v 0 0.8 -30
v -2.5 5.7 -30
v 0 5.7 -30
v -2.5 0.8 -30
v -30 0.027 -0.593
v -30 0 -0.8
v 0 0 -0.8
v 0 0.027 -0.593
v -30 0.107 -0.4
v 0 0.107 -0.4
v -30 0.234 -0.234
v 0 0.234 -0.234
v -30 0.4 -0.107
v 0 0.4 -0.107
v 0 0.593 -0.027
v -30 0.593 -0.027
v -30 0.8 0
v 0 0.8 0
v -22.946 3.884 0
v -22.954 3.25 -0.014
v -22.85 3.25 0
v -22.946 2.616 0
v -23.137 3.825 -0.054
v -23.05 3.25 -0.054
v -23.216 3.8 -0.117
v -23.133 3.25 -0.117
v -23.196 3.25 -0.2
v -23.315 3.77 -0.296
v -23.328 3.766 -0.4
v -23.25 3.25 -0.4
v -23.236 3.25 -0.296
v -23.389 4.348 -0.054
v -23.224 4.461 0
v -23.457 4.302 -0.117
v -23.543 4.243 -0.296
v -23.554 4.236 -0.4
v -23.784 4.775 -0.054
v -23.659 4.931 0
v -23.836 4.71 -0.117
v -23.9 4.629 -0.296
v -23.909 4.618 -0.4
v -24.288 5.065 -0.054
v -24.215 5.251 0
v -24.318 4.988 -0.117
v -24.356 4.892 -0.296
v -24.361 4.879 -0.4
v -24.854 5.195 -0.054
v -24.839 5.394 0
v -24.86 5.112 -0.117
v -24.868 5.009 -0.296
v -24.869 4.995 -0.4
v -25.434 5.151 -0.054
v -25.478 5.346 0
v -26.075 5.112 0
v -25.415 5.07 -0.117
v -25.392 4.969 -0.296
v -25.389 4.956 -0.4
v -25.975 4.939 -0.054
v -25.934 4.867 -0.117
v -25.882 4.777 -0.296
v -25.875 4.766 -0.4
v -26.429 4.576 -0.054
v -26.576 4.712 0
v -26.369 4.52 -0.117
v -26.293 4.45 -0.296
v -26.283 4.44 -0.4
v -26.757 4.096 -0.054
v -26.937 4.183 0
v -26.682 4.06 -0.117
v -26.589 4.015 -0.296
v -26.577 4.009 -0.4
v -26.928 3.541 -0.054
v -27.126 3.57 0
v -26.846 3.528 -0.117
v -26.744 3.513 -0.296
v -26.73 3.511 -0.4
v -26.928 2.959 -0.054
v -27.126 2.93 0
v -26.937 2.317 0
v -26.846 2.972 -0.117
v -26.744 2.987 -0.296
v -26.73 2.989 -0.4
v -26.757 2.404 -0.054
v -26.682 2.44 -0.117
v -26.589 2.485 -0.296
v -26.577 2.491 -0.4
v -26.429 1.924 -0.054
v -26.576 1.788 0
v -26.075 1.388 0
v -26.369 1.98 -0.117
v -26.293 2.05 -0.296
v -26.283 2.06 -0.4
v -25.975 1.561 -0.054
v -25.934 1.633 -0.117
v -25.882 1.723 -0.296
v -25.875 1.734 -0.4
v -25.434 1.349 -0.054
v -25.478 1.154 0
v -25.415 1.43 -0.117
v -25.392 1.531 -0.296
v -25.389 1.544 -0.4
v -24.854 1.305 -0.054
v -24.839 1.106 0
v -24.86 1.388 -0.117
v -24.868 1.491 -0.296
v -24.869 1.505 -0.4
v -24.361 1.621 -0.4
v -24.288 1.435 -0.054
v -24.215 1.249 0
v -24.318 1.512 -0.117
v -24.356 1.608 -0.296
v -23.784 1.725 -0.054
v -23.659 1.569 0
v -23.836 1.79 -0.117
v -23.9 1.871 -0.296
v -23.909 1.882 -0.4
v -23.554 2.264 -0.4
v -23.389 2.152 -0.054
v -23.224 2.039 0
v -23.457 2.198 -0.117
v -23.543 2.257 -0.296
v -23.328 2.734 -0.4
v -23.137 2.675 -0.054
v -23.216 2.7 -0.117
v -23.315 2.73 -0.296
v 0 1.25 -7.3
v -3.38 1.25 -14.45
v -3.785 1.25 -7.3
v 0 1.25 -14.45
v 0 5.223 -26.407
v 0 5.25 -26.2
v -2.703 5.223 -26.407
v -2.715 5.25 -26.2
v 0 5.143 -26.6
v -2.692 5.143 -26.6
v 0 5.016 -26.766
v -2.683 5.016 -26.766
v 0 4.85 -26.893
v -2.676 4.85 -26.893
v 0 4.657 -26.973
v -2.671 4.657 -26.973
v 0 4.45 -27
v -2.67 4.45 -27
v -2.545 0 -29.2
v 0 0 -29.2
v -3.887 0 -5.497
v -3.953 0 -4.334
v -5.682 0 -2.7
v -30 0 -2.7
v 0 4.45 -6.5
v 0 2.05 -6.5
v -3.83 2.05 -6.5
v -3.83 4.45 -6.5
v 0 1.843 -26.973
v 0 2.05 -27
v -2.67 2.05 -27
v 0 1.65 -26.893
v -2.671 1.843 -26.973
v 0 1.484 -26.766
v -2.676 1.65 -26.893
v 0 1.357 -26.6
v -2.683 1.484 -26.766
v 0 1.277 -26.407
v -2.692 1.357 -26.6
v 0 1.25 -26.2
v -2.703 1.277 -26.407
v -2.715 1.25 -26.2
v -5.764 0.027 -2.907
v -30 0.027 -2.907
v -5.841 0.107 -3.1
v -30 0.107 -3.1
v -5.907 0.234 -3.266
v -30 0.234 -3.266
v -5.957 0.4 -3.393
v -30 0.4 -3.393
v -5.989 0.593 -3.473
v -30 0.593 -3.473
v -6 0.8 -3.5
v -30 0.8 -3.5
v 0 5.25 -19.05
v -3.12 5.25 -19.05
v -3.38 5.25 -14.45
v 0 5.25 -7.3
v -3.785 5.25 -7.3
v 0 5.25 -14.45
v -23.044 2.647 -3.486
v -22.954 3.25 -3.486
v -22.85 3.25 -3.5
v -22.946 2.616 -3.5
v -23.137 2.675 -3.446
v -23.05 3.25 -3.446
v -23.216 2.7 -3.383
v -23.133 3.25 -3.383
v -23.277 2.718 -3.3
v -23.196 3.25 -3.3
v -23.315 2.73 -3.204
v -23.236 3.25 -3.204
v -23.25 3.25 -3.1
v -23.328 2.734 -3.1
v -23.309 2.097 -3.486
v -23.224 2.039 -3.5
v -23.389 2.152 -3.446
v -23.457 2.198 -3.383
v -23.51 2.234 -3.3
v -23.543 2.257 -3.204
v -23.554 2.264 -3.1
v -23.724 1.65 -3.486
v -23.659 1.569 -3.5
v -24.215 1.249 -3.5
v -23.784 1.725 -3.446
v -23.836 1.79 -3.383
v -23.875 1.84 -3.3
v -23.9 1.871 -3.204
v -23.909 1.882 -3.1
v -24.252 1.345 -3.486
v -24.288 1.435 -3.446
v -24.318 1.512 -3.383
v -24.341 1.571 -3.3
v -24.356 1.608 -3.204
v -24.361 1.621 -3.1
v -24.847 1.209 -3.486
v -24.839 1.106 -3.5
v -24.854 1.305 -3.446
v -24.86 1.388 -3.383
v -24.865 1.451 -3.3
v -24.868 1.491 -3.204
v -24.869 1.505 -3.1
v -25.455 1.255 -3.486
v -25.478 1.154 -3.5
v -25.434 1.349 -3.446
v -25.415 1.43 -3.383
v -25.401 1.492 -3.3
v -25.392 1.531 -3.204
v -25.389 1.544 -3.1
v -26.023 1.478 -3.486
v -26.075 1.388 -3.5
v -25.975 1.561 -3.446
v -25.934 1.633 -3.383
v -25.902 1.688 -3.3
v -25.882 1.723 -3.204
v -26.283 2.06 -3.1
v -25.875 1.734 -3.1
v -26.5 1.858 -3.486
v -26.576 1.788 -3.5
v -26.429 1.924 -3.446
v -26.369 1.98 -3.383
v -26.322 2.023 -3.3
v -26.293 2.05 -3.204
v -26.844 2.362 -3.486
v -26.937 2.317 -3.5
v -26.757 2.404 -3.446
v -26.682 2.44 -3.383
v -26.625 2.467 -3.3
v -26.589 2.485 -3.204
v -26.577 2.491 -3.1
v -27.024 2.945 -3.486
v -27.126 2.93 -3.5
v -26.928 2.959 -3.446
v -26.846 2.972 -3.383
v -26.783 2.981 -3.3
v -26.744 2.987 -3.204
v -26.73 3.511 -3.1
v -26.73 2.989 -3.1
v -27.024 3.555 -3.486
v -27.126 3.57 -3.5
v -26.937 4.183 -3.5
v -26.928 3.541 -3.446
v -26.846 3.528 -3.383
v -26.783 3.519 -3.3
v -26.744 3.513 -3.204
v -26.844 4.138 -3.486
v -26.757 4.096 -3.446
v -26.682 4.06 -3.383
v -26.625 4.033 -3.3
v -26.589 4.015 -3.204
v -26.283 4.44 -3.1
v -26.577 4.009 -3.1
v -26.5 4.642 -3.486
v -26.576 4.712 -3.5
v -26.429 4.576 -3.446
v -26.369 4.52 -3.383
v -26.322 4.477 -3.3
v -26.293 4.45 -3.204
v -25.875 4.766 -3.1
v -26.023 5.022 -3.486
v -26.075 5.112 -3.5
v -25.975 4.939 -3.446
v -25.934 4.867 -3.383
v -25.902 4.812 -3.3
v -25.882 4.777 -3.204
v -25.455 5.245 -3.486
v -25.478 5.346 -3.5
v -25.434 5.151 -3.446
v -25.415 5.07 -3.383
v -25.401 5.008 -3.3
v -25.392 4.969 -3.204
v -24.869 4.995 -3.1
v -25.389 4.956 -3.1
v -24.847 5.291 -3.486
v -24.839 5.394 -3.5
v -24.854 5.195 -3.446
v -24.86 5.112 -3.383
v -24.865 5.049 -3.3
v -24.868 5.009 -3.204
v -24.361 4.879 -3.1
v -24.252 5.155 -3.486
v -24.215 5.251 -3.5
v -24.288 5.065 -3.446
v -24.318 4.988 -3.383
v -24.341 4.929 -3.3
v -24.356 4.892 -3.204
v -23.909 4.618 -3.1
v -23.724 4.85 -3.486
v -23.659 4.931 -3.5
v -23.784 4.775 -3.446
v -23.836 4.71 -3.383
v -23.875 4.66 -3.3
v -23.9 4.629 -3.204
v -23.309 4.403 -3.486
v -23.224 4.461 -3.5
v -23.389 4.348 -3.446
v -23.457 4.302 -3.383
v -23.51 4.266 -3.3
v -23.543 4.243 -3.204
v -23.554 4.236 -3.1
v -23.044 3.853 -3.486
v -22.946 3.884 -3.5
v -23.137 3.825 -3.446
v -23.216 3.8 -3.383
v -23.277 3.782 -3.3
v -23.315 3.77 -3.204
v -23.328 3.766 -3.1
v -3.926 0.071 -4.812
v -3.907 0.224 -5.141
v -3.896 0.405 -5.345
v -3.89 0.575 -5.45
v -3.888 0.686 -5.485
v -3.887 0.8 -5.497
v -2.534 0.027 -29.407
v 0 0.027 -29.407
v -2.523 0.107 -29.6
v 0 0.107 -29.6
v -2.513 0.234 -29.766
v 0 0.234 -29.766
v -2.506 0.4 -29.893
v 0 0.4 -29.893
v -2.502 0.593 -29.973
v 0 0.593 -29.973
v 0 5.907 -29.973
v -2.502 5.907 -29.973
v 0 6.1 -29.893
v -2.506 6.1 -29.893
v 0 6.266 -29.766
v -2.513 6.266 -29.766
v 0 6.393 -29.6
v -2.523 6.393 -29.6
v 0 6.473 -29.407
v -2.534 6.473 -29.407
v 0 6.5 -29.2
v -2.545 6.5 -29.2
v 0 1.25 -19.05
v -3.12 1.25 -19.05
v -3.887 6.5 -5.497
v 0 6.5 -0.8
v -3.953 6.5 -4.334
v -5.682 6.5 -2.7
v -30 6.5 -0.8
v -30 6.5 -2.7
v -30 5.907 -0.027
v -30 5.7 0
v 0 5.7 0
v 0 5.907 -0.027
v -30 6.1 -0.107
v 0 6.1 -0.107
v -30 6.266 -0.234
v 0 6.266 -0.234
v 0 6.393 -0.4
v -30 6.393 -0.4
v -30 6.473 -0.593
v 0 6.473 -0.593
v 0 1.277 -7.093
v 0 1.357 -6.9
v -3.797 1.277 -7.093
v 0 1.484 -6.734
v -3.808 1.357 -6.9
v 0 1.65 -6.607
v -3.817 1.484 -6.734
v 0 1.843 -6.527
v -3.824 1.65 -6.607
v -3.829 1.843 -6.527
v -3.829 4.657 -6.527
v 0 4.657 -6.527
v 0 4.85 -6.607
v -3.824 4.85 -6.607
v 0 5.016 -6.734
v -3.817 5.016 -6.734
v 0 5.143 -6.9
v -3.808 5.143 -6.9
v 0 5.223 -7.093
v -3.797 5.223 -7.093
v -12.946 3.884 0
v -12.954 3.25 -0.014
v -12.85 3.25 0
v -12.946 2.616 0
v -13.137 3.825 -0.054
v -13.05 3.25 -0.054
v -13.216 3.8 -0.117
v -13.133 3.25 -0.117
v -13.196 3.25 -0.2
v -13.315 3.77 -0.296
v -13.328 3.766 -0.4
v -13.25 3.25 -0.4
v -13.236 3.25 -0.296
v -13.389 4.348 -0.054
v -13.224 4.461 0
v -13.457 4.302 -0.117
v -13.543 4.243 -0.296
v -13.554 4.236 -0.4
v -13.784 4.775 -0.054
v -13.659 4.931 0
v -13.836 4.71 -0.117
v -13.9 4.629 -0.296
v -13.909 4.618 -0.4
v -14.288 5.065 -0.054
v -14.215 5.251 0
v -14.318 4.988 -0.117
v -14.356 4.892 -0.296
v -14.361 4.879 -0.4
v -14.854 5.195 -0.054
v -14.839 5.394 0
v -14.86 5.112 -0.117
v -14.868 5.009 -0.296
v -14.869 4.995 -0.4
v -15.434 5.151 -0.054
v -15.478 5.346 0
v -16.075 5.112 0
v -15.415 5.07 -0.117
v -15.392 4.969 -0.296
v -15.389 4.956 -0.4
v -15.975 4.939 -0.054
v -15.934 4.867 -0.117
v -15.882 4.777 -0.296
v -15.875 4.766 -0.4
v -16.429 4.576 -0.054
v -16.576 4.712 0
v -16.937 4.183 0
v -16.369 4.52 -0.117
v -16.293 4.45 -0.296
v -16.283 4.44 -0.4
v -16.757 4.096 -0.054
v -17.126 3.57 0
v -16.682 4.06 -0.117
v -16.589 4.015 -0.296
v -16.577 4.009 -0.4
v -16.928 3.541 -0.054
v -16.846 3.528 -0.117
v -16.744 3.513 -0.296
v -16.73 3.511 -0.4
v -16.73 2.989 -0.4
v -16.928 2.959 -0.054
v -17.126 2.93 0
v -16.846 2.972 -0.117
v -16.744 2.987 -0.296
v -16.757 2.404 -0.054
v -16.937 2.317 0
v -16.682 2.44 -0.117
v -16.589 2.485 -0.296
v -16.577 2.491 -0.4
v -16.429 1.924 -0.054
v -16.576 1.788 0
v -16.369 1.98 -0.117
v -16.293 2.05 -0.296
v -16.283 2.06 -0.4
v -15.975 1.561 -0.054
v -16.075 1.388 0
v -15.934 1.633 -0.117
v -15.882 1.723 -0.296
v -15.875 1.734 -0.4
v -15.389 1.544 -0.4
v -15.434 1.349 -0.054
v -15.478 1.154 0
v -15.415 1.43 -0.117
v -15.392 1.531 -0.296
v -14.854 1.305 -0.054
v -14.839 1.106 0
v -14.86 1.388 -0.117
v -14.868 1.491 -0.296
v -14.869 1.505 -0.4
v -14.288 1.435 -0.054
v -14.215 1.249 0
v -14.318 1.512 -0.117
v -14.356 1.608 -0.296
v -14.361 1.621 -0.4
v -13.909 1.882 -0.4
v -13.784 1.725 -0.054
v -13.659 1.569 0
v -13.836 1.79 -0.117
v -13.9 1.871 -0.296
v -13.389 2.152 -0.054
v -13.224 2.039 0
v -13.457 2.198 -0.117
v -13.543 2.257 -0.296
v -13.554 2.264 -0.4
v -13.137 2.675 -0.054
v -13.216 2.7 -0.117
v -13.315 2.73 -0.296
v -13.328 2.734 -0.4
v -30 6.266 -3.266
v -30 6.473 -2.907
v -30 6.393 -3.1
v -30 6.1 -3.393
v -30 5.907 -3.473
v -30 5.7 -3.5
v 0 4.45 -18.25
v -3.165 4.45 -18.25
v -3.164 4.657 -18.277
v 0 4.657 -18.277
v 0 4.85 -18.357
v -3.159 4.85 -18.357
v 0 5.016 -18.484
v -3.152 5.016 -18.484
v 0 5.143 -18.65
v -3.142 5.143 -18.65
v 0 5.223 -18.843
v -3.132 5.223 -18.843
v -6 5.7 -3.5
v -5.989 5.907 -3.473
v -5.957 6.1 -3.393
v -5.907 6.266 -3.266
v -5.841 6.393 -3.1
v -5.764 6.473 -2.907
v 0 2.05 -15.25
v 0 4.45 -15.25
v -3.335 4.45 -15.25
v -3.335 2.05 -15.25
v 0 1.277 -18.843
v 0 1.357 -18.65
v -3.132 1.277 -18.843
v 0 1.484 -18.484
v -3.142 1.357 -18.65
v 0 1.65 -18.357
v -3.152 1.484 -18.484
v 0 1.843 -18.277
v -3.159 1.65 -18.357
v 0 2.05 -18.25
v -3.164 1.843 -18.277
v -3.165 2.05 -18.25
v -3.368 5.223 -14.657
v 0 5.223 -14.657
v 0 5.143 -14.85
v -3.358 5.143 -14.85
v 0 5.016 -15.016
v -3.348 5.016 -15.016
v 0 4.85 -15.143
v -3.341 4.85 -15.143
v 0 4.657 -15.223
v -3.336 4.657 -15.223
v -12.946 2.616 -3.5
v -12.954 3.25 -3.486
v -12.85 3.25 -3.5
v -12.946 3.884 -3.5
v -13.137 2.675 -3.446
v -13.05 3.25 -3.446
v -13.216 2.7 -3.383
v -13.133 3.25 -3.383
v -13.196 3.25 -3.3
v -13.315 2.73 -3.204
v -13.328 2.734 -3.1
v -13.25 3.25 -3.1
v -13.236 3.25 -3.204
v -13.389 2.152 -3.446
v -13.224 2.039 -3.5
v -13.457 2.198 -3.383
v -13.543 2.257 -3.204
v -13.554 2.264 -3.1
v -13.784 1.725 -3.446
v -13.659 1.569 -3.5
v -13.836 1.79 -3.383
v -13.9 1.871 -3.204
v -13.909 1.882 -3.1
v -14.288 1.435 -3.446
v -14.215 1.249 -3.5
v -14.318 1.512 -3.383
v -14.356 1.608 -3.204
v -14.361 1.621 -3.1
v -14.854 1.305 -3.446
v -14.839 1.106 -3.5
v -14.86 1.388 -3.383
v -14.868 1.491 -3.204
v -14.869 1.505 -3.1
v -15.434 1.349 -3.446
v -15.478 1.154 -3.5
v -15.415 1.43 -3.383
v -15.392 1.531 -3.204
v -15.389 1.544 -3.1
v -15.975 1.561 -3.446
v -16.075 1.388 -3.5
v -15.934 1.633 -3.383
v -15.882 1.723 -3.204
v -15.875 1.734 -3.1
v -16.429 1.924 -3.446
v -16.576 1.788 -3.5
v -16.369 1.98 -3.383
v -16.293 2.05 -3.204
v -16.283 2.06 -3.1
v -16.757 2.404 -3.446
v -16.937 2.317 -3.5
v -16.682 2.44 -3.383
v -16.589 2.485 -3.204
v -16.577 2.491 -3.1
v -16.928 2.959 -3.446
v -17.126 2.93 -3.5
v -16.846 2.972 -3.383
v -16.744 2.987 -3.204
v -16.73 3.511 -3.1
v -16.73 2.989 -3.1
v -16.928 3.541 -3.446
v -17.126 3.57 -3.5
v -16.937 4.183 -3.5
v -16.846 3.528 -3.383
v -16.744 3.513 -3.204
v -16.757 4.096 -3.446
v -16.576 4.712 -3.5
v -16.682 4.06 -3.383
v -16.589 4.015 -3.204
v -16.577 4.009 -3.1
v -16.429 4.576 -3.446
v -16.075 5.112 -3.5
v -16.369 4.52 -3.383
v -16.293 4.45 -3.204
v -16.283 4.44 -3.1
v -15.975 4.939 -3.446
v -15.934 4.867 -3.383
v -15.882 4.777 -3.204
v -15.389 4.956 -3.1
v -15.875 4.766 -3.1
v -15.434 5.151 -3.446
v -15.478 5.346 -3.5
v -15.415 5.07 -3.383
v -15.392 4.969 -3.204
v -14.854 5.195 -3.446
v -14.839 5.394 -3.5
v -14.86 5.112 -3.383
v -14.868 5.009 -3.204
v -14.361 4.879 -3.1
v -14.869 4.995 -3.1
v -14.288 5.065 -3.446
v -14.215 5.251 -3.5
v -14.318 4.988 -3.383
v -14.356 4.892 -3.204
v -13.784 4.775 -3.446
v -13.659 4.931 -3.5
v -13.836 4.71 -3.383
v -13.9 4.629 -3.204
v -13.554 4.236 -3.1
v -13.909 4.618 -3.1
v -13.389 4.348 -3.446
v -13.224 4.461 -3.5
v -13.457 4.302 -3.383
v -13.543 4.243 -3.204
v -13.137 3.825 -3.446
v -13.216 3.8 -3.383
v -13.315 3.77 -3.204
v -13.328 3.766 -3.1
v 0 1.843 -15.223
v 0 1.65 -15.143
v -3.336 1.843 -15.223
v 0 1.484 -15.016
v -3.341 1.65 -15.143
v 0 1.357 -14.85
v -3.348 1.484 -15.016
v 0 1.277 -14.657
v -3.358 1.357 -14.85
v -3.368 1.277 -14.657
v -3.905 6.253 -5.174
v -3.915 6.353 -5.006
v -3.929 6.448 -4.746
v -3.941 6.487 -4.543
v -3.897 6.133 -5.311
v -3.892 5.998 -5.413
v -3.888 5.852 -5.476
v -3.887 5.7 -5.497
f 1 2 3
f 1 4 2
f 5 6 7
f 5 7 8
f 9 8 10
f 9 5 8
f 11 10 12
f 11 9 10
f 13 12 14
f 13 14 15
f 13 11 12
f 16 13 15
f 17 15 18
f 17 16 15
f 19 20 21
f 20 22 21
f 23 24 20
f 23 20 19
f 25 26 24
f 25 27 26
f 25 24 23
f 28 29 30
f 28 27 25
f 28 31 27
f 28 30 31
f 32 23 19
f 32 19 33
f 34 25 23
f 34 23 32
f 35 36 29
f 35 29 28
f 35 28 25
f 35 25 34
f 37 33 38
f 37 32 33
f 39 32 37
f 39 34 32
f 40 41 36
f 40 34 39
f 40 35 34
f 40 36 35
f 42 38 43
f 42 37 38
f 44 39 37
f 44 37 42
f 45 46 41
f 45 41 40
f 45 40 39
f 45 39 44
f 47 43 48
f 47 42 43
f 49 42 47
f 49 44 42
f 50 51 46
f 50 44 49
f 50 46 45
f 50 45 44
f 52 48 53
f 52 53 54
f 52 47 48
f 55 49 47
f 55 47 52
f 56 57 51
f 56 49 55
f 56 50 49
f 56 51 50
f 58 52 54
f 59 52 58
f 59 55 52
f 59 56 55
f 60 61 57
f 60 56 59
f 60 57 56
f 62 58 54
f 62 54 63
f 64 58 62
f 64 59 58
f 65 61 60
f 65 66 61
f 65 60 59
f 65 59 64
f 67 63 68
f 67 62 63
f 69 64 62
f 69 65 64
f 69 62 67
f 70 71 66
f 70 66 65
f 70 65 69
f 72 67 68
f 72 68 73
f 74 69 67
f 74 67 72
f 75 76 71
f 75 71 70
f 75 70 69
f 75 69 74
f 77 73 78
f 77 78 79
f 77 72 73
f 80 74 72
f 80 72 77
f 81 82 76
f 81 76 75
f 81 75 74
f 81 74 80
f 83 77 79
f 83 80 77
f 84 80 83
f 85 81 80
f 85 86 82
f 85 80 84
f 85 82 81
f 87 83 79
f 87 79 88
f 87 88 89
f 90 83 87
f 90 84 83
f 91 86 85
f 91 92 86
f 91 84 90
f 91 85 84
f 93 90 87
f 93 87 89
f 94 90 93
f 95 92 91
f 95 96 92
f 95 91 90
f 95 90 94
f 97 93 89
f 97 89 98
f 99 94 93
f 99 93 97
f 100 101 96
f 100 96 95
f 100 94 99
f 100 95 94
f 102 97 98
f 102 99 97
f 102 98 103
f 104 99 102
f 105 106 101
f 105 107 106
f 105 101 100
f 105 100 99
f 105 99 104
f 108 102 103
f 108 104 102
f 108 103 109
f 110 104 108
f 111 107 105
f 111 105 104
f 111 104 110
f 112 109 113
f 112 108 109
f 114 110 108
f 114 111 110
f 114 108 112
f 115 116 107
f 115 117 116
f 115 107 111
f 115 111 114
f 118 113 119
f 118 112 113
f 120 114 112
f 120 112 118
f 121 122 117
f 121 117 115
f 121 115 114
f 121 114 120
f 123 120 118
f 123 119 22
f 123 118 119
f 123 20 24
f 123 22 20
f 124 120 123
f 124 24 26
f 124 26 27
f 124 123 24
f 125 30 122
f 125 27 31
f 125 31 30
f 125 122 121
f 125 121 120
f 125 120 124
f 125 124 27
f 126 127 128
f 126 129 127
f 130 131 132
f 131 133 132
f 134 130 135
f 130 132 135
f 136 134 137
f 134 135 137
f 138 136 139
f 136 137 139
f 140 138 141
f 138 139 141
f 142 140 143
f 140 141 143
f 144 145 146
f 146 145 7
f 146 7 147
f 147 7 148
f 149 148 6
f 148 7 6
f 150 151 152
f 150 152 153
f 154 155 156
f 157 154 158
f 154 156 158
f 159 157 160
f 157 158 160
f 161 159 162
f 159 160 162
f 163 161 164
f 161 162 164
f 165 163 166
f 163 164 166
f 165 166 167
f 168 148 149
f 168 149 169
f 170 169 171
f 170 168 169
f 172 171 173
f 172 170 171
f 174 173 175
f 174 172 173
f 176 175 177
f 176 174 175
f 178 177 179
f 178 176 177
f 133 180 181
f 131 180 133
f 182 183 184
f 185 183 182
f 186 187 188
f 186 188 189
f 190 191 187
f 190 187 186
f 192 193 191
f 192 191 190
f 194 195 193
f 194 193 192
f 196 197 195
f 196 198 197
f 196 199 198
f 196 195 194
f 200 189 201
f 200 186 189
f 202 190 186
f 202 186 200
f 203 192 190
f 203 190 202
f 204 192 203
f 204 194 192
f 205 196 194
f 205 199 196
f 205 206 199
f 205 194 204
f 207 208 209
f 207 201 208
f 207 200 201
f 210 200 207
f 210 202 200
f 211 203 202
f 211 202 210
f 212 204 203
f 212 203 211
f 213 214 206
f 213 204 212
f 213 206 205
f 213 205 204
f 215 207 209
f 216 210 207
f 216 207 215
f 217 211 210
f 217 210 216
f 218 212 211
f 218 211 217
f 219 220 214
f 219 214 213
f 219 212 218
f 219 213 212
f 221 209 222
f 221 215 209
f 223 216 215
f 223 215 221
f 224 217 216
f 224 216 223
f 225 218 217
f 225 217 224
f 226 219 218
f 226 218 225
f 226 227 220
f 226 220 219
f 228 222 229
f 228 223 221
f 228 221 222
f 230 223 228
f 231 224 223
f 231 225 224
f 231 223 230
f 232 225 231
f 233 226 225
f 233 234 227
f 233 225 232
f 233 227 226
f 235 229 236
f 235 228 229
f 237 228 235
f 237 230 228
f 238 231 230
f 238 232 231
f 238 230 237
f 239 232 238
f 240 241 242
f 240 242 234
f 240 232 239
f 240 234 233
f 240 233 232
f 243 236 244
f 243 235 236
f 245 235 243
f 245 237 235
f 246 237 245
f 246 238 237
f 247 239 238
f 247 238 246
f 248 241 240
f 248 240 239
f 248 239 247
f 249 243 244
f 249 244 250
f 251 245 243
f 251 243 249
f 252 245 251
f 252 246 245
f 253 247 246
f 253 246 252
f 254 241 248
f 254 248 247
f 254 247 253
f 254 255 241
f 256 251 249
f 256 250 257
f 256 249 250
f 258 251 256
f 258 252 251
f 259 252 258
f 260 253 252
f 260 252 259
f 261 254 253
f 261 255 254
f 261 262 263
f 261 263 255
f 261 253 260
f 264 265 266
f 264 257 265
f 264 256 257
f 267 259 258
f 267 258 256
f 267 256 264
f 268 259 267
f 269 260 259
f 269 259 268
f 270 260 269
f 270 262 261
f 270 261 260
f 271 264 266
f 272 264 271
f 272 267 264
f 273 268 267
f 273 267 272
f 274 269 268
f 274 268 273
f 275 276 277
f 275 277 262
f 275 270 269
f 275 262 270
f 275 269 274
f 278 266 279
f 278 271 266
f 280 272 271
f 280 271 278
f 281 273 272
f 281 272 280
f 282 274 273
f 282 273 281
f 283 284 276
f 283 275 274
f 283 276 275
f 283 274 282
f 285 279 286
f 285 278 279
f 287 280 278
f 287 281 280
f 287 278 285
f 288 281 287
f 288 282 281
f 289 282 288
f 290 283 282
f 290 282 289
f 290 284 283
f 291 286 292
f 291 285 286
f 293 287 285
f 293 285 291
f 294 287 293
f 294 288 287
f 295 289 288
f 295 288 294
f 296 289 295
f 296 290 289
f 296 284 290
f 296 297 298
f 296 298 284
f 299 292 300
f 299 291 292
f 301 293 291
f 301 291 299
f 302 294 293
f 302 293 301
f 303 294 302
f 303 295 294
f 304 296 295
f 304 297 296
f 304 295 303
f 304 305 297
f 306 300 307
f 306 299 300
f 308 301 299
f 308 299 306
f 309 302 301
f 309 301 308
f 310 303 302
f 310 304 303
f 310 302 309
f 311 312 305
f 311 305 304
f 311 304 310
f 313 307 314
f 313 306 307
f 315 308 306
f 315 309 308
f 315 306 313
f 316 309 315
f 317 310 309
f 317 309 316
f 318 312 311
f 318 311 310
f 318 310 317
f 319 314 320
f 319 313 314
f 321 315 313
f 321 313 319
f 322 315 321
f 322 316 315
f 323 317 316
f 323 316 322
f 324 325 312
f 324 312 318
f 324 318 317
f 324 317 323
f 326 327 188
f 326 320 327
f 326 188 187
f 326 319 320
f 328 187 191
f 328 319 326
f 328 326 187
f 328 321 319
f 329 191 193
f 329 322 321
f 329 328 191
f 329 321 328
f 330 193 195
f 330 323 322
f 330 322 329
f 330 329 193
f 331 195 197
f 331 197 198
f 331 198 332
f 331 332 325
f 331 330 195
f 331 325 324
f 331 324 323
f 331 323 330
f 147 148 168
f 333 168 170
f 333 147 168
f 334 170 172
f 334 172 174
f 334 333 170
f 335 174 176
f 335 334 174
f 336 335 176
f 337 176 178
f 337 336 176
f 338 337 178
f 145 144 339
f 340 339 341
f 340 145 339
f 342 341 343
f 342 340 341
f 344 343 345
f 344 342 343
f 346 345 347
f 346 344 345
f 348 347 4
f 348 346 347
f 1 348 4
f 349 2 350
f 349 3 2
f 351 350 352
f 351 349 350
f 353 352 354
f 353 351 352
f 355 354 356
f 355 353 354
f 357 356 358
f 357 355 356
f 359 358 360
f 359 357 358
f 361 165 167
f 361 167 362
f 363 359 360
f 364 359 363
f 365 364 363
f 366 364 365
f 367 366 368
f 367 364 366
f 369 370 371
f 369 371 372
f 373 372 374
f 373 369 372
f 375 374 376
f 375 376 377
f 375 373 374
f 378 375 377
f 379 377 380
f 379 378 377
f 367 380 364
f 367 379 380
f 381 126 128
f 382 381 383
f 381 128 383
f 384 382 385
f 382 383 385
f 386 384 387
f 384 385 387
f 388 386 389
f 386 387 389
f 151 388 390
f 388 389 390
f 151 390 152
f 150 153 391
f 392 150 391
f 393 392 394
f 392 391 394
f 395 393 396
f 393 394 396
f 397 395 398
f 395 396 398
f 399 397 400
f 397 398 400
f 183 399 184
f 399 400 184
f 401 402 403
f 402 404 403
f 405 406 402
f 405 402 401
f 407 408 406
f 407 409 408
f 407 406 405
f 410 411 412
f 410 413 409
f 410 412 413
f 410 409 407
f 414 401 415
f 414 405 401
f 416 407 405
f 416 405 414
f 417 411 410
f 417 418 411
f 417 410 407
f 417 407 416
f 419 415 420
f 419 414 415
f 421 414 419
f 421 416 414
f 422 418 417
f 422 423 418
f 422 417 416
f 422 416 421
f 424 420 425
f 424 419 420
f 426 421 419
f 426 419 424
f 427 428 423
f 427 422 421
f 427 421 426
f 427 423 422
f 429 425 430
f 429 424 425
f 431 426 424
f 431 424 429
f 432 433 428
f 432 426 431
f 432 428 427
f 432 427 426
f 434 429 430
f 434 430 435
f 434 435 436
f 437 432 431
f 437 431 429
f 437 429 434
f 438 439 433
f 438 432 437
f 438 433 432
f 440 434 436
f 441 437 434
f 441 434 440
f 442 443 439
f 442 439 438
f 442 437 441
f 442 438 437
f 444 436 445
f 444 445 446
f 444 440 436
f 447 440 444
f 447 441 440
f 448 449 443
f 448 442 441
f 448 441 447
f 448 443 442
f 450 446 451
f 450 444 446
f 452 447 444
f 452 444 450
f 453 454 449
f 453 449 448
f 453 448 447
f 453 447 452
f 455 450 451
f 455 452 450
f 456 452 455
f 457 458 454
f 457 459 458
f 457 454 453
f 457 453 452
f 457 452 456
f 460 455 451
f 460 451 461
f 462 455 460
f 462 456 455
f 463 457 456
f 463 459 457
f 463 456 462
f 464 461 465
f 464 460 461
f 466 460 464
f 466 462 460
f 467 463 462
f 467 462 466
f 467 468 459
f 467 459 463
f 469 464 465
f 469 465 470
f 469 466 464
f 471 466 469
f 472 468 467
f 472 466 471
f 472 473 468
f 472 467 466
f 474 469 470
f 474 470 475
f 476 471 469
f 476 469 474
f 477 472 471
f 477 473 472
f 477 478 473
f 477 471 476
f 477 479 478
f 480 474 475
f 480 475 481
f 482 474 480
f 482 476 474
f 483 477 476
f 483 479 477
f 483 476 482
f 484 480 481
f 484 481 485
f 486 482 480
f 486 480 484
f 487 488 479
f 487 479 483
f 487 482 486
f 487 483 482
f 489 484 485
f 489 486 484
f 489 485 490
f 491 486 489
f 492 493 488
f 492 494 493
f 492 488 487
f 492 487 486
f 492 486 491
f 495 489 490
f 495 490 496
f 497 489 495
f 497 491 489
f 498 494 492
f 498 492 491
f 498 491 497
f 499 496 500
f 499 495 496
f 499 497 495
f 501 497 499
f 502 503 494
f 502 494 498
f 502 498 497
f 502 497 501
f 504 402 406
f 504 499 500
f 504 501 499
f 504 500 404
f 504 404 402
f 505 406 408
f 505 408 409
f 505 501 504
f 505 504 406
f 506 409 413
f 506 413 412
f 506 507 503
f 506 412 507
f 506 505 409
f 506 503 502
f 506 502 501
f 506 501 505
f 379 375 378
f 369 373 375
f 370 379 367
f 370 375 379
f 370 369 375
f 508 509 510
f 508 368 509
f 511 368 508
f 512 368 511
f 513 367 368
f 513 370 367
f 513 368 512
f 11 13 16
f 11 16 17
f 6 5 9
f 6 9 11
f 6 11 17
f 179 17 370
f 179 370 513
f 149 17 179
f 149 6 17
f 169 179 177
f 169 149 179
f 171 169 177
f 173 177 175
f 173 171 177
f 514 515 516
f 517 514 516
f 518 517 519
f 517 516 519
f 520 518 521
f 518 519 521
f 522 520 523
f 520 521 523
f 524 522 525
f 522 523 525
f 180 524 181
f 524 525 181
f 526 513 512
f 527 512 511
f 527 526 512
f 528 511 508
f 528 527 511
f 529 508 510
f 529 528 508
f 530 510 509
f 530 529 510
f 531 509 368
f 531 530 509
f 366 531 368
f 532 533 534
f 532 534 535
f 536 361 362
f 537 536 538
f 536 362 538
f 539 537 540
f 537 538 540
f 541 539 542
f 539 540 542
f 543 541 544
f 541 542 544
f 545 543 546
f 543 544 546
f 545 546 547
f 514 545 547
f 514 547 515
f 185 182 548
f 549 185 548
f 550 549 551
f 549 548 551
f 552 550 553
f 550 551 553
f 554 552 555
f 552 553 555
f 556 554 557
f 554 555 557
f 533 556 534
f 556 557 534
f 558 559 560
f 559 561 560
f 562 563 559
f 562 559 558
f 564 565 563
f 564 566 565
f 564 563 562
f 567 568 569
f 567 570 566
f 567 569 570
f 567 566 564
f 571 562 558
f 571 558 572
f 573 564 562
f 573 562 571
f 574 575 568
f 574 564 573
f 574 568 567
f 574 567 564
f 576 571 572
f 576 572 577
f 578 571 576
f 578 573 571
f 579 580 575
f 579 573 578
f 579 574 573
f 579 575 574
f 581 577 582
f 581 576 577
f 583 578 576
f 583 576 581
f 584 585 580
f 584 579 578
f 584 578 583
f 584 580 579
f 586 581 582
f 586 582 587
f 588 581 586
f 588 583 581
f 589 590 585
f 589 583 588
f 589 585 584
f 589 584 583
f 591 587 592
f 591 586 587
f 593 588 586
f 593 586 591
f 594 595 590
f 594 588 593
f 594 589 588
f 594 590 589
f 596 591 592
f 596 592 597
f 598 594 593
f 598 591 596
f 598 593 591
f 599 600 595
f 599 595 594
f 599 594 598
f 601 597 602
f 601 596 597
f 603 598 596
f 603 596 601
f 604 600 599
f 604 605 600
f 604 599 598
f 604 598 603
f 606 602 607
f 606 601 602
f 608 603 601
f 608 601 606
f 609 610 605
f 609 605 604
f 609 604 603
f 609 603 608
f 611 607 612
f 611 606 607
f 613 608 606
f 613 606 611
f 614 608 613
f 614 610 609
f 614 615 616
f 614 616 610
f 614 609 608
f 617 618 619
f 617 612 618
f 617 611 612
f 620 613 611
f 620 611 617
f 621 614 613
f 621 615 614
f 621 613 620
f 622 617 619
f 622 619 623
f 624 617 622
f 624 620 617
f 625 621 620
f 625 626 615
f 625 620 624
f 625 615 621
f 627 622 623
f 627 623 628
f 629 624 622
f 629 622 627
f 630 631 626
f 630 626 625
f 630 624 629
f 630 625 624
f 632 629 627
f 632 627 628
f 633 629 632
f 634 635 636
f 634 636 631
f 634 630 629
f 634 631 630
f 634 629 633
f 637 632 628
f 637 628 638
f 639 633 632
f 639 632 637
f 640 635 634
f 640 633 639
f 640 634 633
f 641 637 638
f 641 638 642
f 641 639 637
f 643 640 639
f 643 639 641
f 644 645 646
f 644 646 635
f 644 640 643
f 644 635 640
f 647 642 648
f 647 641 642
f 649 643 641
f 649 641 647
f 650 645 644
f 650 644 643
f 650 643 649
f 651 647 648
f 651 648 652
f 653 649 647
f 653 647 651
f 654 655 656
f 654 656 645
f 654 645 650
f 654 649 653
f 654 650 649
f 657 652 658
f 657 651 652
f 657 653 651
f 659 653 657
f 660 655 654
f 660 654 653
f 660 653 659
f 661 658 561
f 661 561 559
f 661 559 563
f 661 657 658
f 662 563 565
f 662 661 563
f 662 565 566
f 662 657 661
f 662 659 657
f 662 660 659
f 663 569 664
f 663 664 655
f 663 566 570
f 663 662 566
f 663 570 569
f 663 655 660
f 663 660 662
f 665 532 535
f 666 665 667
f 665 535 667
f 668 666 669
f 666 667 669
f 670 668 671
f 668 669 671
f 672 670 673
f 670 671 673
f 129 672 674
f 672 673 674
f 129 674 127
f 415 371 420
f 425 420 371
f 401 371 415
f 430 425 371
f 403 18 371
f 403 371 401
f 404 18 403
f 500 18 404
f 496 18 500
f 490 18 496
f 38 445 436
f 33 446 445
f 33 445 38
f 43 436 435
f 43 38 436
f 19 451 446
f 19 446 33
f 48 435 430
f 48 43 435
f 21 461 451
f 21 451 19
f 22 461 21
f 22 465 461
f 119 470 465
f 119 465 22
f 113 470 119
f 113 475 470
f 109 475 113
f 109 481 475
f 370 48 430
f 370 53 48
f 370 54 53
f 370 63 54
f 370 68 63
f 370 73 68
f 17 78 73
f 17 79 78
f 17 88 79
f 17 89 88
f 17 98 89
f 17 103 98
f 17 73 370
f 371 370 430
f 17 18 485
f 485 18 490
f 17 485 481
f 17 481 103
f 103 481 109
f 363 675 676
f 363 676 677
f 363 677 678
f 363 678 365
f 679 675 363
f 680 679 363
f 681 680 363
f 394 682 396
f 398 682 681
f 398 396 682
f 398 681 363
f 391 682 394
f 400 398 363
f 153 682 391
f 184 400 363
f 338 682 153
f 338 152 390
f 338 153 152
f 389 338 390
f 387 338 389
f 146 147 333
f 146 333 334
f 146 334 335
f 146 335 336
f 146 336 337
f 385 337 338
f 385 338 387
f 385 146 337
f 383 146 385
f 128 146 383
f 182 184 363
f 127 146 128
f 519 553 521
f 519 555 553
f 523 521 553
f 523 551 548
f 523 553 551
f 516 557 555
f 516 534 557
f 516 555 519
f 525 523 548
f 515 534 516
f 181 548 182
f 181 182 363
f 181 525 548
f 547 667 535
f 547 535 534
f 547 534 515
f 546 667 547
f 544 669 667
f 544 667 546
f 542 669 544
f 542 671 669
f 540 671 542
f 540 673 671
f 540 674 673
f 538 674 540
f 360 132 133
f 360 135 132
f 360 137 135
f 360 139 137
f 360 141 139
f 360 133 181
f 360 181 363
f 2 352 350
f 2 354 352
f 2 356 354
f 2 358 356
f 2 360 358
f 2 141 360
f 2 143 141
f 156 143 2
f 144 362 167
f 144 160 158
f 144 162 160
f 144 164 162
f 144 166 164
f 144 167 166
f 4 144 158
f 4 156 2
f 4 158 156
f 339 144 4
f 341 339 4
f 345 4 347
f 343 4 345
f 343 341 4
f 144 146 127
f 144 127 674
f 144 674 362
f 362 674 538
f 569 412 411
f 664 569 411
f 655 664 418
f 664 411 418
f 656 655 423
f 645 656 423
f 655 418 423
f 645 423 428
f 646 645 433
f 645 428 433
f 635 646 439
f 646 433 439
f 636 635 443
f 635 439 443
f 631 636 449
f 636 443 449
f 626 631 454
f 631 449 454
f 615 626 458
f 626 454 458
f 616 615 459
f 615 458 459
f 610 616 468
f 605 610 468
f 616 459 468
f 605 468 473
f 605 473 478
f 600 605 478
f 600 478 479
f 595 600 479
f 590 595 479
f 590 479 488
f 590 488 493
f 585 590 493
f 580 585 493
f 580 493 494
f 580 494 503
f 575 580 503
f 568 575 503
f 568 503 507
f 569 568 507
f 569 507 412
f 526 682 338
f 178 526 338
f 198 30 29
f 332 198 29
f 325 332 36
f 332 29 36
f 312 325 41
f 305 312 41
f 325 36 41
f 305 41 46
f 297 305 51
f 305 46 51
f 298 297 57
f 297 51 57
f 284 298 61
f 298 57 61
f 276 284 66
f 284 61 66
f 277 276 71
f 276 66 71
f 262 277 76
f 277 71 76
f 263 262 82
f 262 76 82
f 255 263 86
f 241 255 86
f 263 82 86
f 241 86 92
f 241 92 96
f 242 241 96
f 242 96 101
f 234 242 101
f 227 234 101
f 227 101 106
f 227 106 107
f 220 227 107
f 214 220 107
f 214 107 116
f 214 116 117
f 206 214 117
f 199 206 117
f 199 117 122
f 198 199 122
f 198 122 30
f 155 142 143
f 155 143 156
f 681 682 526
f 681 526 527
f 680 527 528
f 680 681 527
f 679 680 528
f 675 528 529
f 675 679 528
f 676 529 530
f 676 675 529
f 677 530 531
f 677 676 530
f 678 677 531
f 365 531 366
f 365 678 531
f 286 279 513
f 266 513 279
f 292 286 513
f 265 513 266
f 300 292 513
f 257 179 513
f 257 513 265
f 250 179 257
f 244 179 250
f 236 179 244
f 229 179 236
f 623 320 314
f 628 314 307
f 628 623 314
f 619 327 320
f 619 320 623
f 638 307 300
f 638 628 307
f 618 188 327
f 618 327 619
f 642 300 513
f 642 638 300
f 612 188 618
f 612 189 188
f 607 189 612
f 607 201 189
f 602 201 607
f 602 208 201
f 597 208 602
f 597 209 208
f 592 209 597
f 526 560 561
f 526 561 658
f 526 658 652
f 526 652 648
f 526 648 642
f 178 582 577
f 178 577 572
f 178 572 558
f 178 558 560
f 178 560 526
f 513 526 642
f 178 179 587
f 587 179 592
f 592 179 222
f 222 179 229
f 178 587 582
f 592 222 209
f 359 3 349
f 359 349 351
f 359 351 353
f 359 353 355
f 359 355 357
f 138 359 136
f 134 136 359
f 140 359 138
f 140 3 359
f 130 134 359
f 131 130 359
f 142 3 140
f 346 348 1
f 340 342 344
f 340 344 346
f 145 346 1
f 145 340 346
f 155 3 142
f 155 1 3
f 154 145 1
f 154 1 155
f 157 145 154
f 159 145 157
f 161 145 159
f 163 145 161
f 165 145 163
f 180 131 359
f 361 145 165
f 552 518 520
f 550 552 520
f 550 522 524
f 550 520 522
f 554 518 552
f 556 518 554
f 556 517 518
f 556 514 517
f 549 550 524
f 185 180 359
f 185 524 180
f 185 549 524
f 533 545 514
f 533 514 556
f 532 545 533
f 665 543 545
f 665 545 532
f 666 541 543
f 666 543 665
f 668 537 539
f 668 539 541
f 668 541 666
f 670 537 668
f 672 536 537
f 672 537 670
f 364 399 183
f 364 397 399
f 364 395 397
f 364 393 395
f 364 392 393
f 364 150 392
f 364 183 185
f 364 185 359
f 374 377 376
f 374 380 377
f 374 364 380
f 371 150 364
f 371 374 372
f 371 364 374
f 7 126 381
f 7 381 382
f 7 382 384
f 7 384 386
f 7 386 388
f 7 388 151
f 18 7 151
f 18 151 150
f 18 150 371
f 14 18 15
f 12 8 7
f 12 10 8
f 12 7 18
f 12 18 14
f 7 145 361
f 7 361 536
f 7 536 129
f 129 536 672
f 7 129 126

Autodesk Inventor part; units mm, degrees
ref_plane "YZ Plane" through (0, 0, 0) normal (1, 0, 0) x (0, 1, 0)
ref_plane "XZ Plane" through (0, 0, 0) normal (0, 1, 0) x (-1, 0, 0)
ref_plane "XY Plane" through (0, 0, 0) normal (0, 0, 1) x (1, 0, 0)
sketch "Szkic1" plane through (0, 0, 0) normal (0, 1, 0) x (-1, 0, 0)
  line L0 (0, 0) -> (30, 0)
  line L1 (30, 0) -> (30, -3.5)
  line L2 (30, -3.5) -> (4, -3.5)
  line L3 (4, -3.5) -> (2.5, -30)
  line L4 (2.5, -30) -> (0, -30)
  line L5 (0, -30) -> (0, 0)
  dimension "d0" = 30
  dimension "d1" = 30
  dimension "d2" = 3.5
  dimension "d3" = 2.5
  dimension "d4" = 4
extrude "Wyciągnięcie proste1" add sketch "Szkic1" along normal blind 6.5
sketch "Szkic2" plane through (0, 0, 0) normal (1, 0, 0) x (0, 0, -1)
  line L0 (0, 0) -> (30, 0) projected
  line L1 (30, 0) -> (30, 6.5) projected
  line L2 (0, 6.5) -> (30, 6.5) projected
  line L3 (0, 0) -> (0, 6.5) projected
  line L4 (30, 3.25) -> (0, 3.25) construction
  line L5 (18.25, 5.25) -> (27, 5.25)
  line L6 (27, 5.25) -> (27, 1.25)
  line L7 (27, 1.25) -> (18.25, 1.25)
  line L8 (18.25, 1.25) -> (18.25, 5.25)
  line L9 (18.25, 5.25) -> (27, 1.25) construction
  line L10 (27, 5.25) -> (18.25, 1.25) construction
  line L11 (6.5, 5.25) -> (15.25, 5.25)
  line L12 (15.25, 5.25) -> (15.25, 1.25)
  line L13 (15.25, 1.25) -> (6.5, 1.25)
  line L14 (6.5, 1.25) -> (6.5, 5.25)
  line L15 (6.5, 5.25) -> (15.25, 1.25) construction
  line L16 (15.25, 5.25) -> (6.5, 1.25) construction
  line L17 (3.5, 0) -> (3.5, 6.5) projected
  point P0 (22.625, 3.25)
  point P1 (10.875, 3.25)
  dimension "d7" = 26.5
  dimension "d8" = 3
  dimension "d9" = 3
  dimension "d10" = 3
  dimension "d11" = 4
extrude "Wyciągnięcie proste2" cut sketch "Szkic2" against normal up to surface contours L5 L6 L7 L8 | L11 L12 L13 L14 surface through (-2.5, 0, -30) normal (-0.9984018, 0, -0.0565133)
sketch "Szkic3" plane through (-30, 0, 0) normal (0, 0, 1) x (1, 0, 0)
  line L0 (0, 0) -> (30, 0) projected
  line L1 (30, 0) -> (30, 6.5) projected
  line L2 (0, 6.5) -> (30, 6.5) construction
  line L3 (0, 0) -> (0, 6.5) projected
  line L4 (0, 3.25) -> (30, 3.25) construction
  circle A0 centre (15, 3.25) radius 1.75
  circle A1 centre (5, 3.25) radius 1.75
  dimension "d14" = 3.5
  dimension "d15" = 15
  dimension "d16" = 10
extrude "Wyciągnięcie proste3" cut sketch "Szkic3" against normal up to surface (3.5 mm away)
chamfer "Faza1" distance 2 angle 45 1 edges at (-4, 3.25, -3.5)
fillet "Zaokrąglenie1" radius 0.8 16 edges at (-1.25, 6.5, -30) (-1.25, 0, -30) (-15, 6.5, 0) (-15, 0, 0) (-18, 0, -3.5) (-18, 6.5, -3.5) (-4.9435, 6.5, -4.4984) (-4.9435, 0, -4.4984) (-1.9151, 1.25, -6.5) (-1.9151, 5.25, -6.5) (-1.6675, 5.25, -15.25) (-1.6675, 1.25, -15.25) (-1.5825, 1.25, -18.25) (-1.5825, 5.25, -18.25) (-1.3349, 5.25, -27) (-1.3349, 1.25, -27)
fillet "Zaokrąglenie2" radius 0.4 4 edges at (-16.75, 3.25, -3.5) (-16.75, 3.25, 0) (-26.75, 3.25, 0) (-26.75, 3.25, -3.5)
equation "\"d9\" = d8"
properties part number "noga2"
